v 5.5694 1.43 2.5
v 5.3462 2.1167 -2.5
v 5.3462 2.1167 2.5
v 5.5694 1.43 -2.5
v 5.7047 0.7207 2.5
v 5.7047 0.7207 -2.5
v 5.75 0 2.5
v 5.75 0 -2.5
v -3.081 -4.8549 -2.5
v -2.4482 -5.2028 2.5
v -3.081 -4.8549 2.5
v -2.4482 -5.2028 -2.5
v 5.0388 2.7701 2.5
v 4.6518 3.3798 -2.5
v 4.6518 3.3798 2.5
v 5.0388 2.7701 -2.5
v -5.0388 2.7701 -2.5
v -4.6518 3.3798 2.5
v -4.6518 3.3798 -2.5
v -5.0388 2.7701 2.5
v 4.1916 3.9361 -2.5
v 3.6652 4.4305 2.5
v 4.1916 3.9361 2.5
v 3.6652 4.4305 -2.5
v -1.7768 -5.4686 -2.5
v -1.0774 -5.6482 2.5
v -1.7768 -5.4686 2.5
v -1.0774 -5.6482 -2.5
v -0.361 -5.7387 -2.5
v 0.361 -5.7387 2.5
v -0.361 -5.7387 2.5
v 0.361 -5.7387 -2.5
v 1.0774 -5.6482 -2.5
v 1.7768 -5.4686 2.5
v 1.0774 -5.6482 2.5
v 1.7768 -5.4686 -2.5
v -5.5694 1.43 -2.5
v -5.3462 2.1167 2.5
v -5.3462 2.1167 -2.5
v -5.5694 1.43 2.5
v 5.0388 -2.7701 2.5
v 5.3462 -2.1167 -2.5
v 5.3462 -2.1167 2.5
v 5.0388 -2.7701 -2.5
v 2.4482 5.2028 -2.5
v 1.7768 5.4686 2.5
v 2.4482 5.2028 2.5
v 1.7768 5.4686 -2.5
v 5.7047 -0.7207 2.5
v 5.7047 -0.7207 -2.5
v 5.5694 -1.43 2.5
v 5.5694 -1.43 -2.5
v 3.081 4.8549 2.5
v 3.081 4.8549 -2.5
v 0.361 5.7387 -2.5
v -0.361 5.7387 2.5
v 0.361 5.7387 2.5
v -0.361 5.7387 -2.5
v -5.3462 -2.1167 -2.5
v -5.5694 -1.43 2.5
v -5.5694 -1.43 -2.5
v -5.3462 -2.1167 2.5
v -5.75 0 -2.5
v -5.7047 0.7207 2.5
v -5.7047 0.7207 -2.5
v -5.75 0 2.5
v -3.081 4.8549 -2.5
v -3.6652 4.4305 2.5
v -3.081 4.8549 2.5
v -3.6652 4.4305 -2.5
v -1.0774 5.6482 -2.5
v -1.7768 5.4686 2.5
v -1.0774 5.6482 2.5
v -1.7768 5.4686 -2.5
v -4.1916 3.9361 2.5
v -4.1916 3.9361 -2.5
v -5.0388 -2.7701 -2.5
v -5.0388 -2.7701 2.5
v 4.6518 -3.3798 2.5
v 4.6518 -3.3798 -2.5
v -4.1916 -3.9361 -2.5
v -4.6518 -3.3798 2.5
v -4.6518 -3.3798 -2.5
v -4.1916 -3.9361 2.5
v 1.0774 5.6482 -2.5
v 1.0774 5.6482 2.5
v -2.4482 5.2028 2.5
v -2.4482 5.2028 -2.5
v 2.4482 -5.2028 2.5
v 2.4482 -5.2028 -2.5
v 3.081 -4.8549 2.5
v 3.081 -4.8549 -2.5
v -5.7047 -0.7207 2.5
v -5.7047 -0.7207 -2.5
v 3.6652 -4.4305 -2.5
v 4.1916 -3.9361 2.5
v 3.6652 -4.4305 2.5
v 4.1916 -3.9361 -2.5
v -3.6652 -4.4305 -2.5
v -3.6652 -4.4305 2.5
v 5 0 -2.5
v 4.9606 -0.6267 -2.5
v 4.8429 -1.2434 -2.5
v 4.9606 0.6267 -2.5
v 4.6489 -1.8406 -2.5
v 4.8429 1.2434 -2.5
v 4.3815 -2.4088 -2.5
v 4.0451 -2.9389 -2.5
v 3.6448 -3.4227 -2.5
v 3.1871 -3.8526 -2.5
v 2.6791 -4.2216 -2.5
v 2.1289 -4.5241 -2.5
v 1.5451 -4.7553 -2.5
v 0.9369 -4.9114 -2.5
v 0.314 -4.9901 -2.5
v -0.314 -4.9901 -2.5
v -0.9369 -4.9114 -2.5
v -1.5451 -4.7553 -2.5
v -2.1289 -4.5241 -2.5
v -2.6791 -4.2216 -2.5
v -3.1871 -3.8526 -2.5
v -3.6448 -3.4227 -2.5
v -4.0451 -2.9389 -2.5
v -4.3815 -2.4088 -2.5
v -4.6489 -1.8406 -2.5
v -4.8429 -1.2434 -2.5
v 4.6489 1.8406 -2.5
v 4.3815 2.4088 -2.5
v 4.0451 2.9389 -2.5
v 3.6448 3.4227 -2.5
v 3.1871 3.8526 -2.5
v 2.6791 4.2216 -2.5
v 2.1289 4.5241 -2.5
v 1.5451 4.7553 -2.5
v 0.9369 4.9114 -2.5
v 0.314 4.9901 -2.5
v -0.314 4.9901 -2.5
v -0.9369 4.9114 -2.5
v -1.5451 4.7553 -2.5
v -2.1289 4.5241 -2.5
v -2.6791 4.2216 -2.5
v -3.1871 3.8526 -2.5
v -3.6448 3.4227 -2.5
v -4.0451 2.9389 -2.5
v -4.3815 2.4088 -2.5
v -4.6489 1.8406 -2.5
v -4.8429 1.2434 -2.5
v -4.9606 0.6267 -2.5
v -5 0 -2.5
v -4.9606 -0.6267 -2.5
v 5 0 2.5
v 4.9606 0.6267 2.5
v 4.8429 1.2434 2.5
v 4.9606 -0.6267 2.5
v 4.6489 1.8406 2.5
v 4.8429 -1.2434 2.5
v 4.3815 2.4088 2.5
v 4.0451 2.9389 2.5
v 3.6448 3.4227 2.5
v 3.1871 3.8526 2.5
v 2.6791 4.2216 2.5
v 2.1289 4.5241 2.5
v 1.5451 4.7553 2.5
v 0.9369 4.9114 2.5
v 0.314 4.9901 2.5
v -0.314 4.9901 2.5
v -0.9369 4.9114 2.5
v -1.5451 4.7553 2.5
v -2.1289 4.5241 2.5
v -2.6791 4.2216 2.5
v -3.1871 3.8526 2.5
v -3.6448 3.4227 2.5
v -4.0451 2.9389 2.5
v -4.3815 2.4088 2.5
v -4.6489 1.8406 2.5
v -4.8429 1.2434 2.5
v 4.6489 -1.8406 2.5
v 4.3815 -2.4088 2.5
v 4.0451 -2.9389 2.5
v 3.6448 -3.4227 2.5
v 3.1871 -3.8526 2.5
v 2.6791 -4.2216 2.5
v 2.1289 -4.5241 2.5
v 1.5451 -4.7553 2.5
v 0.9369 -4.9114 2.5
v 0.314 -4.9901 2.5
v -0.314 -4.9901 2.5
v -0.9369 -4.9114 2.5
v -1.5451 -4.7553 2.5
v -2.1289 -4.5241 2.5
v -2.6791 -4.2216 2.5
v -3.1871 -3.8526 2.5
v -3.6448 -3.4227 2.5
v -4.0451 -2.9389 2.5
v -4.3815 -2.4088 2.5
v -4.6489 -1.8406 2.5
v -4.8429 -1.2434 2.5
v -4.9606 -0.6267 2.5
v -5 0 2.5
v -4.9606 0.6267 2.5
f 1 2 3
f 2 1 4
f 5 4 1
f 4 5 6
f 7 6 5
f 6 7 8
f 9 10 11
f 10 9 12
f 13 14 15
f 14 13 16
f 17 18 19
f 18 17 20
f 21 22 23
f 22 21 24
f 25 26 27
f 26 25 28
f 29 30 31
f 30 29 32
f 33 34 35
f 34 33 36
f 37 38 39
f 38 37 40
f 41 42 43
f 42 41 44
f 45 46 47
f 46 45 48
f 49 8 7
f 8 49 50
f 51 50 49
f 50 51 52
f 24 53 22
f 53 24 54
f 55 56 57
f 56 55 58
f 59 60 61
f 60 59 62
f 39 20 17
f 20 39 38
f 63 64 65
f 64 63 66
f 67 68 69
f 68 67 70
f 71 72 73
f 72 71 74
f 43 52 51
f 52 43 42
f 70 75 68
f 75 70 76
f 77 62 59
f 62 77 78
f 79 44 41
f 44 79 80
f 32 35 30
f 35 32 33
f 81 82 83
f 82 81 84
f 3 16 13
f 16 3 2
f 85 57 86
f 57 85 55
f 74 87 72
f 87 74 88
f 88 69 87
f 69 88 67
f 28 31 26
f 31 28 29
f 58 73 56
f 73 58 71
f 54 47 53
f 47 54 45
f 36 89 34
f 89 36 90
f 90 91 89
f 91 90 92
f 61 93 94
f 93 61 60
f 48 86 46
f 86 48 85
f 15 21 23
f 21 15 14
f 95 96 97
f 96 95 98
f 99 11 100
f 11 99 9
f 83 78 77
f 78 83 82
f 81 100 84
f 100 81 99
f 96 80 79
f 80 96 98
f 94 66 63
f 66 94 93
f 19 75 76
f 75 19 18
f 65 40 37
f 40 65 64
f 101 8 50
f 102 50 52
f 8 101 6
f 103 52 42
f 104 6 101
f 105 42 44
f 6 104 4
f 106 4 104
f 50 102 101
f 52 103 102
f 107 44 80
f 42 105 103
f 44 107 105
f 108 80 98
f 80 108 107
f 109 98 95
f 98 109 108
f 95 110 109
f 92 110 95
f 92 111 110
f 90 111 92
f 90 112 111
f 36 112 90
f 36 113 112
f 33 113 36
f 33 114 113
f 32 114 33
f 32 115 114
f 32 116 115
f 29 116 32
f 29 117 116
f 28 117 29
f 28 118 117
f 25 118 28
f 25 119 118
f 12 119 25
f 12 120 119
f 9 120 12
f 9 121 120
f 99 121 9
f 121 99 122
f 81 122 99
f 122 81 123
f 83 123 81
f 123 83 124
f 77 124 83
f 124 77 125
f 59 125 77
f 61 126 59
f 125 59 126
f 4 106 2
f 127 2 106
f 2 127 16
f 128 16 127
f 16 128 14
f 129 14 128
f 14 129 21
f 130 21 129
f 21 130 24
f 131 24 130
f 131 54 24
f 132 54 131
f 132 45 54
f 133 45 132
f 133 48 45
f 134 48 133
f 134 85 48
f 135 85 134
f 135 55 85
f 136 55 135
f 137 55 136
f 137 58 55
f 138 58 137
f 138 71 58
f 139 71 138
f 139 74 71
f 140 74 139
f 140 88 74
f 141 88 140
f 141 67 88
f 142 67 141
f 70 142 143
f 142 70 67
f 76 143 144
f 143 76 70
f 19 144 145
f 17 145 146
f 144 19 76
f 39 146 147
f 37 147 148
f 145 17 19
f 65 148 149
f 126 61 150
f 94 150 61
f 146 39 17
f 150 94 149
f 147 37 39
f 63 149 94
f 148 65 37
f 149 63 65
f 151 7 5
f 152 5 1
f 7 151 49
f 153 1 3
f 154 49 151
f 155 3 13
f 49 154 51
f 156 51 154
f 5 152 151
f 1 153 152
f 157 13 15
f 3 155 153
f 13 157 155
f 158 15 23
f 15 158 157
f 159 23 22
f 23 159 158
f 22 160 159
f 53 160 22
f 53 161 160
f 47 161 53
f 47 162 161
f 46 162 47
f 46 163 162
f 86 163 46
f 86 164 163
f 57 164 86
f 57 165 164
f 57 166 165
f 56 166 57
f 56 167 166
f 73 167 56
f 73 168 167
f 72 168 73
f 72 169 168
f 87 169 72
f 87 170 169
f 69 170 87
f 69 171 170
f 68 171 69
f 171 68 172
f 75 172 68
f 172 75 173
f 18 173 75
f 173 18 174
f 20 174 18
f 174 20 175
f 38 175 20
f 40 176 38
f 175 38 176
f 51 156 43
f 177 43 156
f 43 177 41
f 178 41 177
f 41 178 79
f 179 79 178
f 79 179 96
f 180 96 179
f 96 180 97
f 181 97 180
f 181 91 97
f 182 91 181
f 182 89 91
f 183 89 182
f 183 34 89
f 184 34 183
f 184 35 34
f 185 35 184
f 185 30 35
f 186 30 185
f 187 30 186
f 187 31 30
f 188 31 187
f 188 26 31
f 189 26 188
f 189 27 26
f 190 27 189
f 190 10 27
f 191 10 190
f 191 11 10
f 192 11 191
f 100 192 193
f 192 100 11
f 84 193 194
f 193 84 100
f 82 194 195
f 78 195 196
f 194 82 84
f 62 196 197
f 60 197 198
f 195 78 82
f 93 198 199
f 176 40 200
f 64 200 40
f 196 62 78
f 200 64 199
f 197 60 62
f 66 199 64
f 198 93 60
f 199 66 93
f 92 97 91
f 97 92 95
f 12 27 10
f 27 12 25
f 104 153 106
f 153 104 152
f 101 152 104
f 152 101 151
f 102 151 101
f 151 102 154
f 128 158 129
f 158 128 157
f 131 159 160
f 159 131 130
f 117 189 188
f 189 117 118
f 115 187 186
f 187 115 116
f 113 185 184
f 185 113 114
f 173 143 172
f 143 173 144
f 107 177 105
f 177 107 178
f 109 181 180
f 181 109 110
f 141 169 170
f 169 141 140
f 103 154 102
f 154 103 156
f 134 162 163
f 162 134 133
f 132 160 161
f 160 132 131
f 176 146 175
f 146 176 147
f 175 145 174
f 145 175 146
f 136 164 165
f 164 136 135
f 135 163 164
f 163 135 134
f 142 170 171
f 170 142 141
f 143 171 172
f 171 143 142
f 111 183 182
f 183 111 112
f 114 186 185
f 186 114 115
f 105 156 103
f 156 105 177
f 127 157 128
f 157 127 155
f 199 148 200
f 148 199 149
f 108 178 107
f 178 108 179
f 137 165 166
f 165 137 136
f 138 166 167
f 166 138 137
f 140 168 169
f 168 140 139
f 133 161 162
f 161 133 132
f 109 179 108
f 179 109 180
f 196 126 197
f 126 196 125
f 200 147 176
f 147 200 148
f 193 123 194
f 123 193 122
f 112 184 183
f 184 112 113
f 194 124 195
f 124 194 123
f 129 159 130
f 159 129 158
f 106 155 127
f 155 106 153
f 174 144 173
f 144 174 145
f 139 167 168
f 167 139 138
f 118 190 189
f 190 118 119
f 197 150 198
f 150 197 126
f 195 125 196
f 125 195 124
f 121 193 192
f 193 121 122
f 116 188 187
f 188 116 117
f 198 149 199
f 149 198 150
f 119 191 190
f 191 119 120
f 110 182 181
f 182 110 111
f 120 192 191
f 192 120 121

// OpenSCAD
$fn = 50;


difference() {
	union() {
		translate(v = [0, 0, -2.5000000000]) {
			cylinder(h = 5, r = 5.7500000000);
		}
	}
	union() {
		translate(v = [0, 0, -100.0000000000]) {
			cylinder(h = 200, r = 5.0000000000);
		}
	}
}
